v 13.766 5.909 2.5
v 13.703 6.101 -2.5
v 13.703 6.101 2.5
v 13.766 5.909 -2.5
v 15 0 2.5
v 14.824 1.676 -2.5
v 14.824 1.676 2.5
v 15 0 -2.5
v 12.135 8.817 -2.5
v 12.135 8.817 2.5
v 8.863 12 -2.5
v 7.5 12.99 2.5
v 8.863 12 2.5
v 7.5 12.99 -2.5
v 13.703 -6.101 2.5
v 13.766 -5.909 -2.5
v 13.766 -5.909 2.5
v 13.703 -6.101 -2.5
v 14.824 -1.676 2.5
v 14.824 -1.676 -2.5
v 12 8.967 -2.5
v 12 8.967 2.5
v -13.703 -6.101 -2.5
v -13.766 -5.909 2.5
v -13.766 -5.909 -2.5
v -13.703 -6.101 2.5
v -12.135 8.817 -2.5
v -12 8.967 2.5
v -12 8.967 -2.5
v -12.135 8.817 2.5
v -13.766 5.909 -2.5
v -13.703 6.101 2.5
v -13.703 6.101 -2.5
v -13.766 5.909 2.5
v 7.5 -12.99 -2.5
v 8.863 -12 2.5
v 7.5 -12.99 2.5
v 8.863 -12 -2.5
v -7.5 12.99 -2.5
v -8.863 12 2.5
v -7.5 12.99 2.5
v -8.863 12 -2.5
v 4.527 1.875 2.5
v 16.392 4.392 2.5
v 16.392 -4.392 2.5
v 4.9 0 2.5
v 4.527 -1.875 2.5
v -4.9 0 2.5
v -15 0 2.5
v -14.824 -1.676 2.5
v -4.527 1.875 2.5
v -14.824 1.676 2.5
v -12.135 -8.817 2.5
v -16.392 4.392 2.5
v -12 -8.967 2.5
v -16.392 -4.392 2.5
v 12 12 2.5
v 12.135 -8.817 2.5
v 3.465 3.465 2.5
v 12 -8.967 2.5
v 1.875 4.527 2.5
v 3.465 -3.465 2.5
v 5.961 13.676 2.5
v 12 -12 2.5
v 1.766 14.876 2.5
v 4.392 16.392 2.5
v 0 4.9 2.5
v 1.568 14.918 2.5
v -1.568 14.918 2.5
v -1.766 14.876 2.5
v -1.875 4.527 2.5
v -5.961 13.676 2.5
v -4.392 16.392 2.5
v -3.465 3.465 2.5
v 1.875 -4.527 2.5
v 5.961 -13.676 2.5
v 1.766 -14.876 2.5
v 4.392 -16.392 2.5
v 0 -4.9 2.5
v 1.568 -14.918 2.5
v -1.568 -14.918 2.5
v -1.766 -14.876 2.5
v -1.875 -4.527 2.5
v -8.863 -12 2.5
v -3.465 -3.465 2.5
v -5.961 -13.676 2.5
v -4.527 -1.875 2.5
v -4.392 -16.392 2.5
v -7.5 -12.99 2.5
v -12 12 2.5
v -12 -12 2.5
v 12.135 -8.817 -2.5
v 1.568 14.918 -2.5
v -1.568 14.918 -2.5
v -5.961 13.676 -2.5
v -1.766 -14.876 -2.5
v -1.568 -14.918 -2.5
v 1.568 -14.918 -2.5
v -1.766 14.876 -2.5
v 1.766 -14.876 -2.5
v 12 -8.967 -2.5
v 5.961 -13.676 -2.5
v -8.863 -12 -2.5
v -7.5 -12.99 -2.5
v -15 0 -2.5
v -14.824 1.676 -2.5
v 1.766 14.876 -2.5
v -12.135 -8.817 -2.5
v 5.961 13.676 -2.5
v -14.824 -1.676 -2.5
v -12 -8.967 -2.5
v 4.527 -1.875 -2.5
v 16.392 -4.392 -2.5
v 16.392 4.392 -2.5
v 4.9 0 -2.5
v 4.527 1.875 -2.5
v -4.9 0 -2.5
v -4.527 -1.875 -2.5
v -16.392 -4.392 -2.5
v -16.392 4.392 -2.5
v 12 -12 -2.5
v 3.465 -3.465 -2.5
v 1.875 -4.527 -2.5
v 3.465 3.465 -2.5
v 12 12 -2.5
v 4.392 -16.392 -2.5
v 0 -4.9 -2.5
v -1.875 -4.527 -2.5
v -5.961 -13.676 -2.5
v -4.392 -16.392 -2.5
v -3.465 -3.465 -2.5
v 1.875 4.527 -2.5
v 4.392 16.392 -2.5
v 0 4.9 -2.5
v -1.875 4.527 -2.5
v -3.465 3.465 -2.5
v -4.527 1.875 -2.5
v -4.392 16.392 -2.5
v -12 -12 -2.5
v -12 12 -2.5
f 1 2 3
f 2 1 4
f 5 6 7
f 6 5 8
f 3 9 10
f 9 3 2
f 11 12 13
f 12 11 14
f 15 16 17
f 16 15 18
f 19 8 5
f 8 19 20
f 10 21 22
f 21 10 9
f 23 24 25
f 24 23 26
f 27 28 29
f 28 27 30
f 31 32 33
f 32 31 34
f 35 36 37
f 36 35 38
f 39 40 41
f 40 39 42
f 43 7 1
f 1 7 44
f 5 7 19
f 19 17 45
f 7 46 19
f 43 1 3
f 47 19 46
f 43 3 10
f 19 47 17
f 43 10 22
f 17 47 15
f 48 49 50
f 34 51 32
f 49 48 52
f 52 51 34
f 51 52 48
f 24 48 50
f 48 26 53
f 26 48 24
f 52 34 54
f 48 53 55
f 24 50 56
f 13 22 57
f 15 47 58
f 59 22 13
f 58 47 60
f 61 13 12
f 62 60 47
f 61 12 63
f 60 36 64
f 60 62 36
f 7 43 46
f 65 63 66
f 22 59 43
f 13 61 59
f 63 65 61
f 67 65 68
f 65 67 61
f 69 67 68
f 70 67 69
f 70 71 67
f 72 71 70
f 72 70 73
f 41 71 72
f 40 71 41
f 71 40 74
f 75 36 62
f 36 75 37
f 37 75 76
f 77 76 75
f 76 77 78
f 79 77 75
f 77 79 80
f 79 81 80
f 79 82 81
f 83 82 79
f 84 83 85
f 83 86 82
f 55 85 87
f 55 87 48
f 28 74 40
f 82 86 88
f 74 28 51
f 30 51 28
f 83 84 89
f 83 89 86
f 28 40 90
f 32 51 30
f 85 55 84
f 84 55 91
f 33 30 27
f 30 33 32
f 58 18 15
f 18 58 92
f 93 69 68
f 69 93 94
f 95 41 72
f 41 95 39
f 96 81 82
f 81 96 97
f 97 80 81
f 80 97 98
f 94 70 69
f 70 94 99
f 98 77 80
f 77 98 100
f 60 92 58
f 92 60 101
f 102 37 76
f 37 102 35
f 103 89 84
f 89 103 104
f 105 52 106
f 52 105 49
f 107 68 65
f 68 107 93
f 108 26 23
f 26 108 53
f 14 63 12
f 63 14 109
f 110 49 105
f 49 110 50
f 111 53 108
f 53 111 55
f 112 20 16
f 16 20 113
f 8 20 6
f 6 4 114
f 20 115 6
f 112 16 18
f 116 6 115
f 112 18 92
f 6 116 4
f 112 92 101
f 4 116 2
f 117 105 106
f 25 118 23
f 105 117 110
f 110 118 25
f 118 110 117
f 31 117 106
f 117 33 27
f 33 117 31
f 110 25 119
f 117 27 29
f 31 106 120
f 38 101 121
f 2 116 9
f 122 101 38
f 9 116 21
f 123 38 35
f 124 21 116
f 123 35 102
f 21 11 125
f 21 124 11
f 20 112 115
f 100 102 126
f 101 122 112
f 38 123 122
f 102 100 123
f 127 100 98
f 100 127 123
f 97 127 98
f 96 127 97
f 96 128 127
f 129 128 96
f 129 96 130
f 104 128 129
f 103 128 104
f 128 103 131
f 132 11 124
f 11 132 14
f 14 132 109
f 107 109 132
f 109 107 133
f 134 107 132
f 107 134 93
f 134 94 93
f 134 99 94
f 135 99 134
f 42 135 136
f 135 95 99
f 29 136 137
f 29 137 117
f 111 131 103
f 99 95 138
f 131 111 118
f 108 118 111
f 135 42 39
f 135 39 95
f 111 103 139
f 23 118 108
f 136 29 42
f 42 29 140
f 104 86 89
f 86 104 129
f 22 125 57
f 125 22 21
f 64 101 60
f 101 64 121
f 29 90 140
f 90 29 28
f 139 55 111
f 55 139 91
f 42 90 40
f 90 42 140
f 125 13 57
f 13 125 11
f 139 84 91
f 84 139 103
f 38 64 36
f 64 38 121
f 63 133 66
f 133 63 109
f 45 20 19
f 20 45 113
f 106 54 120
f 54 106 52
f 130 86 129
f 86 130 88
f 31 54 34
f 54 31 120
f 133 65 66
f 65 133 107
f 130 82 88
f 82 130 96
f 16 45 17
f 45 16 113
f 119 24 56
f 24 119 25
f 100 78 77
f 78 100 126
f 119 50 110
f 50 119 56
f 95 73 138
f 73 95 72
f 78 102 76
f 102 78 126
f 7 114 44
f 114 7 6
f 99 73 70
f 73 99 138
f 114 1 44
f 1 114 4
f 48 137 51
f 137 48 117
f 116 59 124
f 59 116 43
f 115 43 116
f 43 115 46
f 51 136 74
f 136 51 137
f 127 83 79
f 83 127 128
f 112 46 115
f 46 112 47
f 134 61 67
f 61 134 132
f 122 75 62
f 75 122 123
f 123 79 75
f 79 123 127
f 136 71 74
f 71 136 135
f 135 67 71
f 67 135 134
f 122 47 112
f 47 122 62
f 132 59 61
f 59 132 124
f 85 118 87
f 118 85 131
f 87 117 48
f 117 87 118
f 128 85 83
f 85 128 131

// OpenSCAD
height = 5;
radius = 4.90;
difference () {
     union () {
	  cylinder (h=height, r=15, center=true);
	  rotate(0) cube([12*2,12*2,height], center=true);
	  rotate(30) cube([12*2,12*2,height], center=true);
	  rotate(60) cube([12*2,12*2,height], center=true);
     }
	  cylinder (h=height+1, r=radius, center=true);
}

//translate([-2.5,4.25,0]) rotate(45) cube([7,2,height], center=true);
